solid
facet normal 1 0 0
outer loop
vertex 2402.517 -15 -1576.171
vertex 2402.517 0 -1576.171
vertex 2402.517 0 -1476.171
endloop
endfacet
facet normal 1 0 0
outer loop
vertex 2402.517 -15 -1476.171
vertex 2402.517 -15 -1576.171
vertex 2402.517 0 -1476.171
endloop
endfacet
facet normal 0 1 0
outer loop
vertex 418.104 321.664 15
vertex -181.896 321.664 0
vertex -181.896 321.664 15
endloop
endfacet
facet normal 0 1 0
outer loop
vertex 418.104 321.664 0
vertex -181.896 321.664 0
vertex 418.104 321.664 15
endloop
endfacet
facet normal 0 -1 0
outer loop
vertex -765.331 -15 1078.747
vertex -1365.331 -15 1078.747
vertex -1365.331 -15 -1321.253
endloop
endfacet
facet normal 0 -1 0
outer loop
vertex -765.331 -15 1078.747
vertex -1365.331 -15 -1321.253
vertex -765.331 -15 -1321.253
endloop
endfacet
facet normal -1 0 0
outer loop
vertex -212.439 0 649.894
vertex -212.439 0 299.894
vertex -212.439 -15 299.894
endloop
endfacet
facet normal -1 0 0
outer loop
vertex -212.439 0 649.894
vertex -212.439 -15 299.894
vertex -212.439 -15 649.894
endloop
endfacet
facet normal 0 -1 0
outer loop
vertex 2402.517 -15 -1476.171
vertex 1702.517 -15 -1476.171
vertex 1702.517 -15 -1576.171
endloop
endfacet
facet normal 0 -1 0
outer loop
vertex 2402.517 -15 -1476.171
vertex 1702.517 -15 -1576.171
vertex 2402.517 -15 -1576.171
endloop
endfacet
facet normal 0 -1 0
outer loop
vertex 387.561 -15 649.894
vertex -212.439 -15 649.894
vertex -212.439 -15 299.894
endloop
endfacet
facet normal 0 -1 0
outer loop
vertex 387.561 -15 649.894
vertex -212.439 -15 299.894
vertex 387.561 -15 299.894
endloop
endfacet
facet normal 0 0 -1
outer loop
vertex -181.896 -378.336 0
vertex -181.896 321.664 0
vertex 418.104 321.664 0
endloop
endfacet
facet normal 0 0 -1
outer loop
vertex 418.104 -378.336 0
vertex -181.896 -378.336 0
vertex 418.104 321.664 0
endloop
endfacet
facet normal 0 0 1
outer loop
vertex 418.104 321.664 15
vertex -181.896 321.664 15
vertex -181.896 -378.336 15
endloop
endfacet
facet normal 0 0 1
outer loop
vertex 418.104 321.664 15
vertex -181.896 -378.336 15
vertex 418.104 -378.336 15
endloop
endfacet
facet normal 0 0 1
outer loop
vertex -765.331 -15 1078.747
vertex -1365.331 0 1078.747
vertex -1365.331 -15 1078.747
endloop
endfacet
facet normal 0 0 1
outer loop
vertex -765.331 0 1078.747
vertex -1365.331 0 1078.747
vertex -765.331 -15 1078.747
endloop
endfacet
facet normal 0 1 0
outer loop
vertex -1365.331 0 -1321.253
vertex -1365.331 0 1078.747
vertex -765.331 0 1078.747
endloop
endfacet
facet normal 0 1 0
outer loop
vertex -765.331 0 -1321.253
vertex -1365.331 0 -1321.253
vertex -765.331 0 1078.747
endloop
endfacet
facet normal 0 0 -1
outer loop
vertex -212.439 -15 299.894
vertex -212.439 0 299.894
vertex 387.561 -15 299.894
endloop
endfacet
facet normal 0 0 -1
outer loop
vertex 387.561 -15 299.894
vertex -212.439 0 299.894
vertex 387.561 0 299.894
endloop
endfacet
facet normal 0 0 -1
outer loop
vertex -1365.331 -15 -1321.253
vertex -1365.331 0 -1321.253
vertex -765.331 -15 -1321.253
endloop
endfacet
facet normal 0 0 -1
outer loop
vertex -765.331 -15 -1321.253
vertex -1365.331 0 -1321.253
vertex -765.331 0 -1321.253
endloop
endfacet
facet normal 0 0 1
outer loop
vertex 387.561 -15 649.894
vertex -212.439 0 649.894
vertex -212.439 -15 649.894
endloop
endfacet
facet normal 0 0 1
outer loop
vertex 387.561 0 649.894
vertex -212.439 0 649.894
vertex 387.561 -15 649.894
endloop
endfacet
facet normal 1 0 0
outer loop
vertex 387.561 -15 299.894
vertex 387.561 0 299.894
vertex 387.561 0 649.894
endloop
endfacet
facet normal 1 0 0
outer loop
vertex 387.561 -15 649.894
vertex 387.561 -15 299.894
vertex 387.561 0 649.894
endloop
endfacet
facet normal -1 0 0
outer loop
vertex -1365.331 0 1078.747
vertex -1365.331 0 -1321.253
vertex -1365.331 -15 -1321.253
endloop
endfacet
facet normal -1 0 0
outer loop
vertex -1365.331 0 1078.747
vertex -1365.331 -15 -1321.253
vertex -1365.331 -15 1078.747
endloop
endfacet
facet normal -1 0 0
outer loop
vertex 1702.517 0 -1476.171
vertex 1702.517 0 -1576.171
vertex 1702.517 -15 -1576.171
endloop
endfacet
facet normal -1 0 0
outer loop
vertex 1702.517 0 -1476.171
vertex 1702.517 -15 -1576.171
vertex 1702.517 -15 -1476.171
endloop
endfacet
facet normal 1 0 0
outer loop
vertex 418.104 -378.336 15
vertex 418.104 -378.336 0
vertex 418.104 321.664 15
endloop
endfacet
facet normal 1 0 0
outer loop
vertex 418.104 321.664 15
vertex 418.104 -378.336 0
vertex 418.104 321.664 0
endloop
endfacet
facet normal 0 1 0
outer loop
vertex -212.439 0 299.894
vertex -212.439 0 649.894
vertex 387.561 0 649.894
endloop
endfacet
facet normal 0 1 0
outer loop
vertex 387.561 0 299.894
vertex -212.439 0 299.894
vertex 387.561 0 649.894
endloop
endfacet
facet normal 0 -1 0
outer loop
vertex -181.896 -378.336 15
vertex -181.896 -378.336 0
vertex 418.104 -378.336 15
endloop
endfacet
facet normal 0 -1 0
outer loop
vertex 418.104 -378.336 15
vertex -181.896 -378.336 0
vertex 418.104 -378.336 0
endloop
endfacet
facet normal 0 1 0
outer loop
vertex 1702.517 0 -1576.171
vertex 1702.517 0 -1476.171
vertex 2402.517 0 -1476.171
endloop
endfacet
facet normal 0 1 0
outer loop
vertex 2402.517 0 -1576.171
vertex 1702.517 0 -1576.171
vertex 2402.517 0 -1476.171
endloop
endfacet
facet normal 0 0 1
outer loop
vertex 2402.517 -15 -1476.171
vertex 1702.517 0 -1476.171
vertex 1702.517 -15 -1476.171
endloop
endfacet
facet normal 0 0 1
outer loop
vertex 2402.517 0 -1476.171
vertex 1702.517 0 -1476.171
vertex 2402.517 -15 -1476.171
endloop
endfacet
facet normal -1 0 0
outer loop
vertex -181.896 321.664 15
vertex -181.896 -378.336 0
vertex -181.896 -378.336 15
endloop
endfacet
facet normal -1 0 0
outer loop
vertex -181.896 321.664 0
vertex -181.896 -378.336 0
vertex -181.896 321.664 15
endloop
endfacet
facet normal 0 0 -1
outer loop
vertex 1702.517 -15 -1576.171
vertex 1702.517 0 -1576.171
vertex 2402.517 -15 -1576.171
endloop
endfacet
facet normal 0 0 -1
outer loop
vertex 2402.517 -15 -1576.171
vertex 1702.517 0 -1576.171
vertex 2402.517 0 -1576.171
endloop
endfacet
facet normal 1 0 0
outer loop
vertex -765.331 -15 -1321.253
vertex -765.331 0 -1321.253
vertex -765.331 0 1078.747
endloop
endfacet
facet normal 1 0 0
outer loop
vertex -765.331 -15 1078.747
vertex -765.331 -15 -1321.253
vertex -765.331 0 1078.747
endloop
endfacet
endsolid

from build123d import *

# Parameters (mm, degrees)
F0_W     = 600
F0_H     = 2400
F1_DEPTH = 15
F2_W     = 600
F2_H     = 700
F3_DEPTH = 15
F4_W     = 700
F4_H     = 100
F5_DEPTH = 15
F6_W     = 600
F6_H     = 350
F7_DEPTH = 15


with BuildPart() as f1:
    # F0 (on Front) → F1 (new body)
    with BuildSketch(Plane.XZ):
        with Locations((-1065.331316, -121.252507)):
            Rectangle(F0_W, F0_H)
    extrude(amount=F1_DEPTH)


with BuildPart() as f3:
    # F2 (on Top) → F3 (new body)
    with BuildSketch(Plane.XY):
        with Locations((118.104118, -28.335744)):
            Rectangle(F2_W, F2_H)
    extrude(amount=F3_DEPTH)


with BuildPart() as f5:
    # F4 (on Front) → F5 (new body)
    with BuildSketch(Plane.XZ):
        with Locations((2052.516913, -1526.170564)):
            Rectangle(F4_W, F4_H)
    extrude(amount=F5_DEPTH)


with BuildPart() as f7:
    # F6 (on Front) → F7 (new body)
    with BuildSketch(Plane.XZ):
        with Locations((87.561053, 474.893826)):
            Rectangle(F6_W, F6_H)
    extrude(amount=F7_DEPTH)


solid = Compound([f1.part, f3.part, f5.part, f7.part])
